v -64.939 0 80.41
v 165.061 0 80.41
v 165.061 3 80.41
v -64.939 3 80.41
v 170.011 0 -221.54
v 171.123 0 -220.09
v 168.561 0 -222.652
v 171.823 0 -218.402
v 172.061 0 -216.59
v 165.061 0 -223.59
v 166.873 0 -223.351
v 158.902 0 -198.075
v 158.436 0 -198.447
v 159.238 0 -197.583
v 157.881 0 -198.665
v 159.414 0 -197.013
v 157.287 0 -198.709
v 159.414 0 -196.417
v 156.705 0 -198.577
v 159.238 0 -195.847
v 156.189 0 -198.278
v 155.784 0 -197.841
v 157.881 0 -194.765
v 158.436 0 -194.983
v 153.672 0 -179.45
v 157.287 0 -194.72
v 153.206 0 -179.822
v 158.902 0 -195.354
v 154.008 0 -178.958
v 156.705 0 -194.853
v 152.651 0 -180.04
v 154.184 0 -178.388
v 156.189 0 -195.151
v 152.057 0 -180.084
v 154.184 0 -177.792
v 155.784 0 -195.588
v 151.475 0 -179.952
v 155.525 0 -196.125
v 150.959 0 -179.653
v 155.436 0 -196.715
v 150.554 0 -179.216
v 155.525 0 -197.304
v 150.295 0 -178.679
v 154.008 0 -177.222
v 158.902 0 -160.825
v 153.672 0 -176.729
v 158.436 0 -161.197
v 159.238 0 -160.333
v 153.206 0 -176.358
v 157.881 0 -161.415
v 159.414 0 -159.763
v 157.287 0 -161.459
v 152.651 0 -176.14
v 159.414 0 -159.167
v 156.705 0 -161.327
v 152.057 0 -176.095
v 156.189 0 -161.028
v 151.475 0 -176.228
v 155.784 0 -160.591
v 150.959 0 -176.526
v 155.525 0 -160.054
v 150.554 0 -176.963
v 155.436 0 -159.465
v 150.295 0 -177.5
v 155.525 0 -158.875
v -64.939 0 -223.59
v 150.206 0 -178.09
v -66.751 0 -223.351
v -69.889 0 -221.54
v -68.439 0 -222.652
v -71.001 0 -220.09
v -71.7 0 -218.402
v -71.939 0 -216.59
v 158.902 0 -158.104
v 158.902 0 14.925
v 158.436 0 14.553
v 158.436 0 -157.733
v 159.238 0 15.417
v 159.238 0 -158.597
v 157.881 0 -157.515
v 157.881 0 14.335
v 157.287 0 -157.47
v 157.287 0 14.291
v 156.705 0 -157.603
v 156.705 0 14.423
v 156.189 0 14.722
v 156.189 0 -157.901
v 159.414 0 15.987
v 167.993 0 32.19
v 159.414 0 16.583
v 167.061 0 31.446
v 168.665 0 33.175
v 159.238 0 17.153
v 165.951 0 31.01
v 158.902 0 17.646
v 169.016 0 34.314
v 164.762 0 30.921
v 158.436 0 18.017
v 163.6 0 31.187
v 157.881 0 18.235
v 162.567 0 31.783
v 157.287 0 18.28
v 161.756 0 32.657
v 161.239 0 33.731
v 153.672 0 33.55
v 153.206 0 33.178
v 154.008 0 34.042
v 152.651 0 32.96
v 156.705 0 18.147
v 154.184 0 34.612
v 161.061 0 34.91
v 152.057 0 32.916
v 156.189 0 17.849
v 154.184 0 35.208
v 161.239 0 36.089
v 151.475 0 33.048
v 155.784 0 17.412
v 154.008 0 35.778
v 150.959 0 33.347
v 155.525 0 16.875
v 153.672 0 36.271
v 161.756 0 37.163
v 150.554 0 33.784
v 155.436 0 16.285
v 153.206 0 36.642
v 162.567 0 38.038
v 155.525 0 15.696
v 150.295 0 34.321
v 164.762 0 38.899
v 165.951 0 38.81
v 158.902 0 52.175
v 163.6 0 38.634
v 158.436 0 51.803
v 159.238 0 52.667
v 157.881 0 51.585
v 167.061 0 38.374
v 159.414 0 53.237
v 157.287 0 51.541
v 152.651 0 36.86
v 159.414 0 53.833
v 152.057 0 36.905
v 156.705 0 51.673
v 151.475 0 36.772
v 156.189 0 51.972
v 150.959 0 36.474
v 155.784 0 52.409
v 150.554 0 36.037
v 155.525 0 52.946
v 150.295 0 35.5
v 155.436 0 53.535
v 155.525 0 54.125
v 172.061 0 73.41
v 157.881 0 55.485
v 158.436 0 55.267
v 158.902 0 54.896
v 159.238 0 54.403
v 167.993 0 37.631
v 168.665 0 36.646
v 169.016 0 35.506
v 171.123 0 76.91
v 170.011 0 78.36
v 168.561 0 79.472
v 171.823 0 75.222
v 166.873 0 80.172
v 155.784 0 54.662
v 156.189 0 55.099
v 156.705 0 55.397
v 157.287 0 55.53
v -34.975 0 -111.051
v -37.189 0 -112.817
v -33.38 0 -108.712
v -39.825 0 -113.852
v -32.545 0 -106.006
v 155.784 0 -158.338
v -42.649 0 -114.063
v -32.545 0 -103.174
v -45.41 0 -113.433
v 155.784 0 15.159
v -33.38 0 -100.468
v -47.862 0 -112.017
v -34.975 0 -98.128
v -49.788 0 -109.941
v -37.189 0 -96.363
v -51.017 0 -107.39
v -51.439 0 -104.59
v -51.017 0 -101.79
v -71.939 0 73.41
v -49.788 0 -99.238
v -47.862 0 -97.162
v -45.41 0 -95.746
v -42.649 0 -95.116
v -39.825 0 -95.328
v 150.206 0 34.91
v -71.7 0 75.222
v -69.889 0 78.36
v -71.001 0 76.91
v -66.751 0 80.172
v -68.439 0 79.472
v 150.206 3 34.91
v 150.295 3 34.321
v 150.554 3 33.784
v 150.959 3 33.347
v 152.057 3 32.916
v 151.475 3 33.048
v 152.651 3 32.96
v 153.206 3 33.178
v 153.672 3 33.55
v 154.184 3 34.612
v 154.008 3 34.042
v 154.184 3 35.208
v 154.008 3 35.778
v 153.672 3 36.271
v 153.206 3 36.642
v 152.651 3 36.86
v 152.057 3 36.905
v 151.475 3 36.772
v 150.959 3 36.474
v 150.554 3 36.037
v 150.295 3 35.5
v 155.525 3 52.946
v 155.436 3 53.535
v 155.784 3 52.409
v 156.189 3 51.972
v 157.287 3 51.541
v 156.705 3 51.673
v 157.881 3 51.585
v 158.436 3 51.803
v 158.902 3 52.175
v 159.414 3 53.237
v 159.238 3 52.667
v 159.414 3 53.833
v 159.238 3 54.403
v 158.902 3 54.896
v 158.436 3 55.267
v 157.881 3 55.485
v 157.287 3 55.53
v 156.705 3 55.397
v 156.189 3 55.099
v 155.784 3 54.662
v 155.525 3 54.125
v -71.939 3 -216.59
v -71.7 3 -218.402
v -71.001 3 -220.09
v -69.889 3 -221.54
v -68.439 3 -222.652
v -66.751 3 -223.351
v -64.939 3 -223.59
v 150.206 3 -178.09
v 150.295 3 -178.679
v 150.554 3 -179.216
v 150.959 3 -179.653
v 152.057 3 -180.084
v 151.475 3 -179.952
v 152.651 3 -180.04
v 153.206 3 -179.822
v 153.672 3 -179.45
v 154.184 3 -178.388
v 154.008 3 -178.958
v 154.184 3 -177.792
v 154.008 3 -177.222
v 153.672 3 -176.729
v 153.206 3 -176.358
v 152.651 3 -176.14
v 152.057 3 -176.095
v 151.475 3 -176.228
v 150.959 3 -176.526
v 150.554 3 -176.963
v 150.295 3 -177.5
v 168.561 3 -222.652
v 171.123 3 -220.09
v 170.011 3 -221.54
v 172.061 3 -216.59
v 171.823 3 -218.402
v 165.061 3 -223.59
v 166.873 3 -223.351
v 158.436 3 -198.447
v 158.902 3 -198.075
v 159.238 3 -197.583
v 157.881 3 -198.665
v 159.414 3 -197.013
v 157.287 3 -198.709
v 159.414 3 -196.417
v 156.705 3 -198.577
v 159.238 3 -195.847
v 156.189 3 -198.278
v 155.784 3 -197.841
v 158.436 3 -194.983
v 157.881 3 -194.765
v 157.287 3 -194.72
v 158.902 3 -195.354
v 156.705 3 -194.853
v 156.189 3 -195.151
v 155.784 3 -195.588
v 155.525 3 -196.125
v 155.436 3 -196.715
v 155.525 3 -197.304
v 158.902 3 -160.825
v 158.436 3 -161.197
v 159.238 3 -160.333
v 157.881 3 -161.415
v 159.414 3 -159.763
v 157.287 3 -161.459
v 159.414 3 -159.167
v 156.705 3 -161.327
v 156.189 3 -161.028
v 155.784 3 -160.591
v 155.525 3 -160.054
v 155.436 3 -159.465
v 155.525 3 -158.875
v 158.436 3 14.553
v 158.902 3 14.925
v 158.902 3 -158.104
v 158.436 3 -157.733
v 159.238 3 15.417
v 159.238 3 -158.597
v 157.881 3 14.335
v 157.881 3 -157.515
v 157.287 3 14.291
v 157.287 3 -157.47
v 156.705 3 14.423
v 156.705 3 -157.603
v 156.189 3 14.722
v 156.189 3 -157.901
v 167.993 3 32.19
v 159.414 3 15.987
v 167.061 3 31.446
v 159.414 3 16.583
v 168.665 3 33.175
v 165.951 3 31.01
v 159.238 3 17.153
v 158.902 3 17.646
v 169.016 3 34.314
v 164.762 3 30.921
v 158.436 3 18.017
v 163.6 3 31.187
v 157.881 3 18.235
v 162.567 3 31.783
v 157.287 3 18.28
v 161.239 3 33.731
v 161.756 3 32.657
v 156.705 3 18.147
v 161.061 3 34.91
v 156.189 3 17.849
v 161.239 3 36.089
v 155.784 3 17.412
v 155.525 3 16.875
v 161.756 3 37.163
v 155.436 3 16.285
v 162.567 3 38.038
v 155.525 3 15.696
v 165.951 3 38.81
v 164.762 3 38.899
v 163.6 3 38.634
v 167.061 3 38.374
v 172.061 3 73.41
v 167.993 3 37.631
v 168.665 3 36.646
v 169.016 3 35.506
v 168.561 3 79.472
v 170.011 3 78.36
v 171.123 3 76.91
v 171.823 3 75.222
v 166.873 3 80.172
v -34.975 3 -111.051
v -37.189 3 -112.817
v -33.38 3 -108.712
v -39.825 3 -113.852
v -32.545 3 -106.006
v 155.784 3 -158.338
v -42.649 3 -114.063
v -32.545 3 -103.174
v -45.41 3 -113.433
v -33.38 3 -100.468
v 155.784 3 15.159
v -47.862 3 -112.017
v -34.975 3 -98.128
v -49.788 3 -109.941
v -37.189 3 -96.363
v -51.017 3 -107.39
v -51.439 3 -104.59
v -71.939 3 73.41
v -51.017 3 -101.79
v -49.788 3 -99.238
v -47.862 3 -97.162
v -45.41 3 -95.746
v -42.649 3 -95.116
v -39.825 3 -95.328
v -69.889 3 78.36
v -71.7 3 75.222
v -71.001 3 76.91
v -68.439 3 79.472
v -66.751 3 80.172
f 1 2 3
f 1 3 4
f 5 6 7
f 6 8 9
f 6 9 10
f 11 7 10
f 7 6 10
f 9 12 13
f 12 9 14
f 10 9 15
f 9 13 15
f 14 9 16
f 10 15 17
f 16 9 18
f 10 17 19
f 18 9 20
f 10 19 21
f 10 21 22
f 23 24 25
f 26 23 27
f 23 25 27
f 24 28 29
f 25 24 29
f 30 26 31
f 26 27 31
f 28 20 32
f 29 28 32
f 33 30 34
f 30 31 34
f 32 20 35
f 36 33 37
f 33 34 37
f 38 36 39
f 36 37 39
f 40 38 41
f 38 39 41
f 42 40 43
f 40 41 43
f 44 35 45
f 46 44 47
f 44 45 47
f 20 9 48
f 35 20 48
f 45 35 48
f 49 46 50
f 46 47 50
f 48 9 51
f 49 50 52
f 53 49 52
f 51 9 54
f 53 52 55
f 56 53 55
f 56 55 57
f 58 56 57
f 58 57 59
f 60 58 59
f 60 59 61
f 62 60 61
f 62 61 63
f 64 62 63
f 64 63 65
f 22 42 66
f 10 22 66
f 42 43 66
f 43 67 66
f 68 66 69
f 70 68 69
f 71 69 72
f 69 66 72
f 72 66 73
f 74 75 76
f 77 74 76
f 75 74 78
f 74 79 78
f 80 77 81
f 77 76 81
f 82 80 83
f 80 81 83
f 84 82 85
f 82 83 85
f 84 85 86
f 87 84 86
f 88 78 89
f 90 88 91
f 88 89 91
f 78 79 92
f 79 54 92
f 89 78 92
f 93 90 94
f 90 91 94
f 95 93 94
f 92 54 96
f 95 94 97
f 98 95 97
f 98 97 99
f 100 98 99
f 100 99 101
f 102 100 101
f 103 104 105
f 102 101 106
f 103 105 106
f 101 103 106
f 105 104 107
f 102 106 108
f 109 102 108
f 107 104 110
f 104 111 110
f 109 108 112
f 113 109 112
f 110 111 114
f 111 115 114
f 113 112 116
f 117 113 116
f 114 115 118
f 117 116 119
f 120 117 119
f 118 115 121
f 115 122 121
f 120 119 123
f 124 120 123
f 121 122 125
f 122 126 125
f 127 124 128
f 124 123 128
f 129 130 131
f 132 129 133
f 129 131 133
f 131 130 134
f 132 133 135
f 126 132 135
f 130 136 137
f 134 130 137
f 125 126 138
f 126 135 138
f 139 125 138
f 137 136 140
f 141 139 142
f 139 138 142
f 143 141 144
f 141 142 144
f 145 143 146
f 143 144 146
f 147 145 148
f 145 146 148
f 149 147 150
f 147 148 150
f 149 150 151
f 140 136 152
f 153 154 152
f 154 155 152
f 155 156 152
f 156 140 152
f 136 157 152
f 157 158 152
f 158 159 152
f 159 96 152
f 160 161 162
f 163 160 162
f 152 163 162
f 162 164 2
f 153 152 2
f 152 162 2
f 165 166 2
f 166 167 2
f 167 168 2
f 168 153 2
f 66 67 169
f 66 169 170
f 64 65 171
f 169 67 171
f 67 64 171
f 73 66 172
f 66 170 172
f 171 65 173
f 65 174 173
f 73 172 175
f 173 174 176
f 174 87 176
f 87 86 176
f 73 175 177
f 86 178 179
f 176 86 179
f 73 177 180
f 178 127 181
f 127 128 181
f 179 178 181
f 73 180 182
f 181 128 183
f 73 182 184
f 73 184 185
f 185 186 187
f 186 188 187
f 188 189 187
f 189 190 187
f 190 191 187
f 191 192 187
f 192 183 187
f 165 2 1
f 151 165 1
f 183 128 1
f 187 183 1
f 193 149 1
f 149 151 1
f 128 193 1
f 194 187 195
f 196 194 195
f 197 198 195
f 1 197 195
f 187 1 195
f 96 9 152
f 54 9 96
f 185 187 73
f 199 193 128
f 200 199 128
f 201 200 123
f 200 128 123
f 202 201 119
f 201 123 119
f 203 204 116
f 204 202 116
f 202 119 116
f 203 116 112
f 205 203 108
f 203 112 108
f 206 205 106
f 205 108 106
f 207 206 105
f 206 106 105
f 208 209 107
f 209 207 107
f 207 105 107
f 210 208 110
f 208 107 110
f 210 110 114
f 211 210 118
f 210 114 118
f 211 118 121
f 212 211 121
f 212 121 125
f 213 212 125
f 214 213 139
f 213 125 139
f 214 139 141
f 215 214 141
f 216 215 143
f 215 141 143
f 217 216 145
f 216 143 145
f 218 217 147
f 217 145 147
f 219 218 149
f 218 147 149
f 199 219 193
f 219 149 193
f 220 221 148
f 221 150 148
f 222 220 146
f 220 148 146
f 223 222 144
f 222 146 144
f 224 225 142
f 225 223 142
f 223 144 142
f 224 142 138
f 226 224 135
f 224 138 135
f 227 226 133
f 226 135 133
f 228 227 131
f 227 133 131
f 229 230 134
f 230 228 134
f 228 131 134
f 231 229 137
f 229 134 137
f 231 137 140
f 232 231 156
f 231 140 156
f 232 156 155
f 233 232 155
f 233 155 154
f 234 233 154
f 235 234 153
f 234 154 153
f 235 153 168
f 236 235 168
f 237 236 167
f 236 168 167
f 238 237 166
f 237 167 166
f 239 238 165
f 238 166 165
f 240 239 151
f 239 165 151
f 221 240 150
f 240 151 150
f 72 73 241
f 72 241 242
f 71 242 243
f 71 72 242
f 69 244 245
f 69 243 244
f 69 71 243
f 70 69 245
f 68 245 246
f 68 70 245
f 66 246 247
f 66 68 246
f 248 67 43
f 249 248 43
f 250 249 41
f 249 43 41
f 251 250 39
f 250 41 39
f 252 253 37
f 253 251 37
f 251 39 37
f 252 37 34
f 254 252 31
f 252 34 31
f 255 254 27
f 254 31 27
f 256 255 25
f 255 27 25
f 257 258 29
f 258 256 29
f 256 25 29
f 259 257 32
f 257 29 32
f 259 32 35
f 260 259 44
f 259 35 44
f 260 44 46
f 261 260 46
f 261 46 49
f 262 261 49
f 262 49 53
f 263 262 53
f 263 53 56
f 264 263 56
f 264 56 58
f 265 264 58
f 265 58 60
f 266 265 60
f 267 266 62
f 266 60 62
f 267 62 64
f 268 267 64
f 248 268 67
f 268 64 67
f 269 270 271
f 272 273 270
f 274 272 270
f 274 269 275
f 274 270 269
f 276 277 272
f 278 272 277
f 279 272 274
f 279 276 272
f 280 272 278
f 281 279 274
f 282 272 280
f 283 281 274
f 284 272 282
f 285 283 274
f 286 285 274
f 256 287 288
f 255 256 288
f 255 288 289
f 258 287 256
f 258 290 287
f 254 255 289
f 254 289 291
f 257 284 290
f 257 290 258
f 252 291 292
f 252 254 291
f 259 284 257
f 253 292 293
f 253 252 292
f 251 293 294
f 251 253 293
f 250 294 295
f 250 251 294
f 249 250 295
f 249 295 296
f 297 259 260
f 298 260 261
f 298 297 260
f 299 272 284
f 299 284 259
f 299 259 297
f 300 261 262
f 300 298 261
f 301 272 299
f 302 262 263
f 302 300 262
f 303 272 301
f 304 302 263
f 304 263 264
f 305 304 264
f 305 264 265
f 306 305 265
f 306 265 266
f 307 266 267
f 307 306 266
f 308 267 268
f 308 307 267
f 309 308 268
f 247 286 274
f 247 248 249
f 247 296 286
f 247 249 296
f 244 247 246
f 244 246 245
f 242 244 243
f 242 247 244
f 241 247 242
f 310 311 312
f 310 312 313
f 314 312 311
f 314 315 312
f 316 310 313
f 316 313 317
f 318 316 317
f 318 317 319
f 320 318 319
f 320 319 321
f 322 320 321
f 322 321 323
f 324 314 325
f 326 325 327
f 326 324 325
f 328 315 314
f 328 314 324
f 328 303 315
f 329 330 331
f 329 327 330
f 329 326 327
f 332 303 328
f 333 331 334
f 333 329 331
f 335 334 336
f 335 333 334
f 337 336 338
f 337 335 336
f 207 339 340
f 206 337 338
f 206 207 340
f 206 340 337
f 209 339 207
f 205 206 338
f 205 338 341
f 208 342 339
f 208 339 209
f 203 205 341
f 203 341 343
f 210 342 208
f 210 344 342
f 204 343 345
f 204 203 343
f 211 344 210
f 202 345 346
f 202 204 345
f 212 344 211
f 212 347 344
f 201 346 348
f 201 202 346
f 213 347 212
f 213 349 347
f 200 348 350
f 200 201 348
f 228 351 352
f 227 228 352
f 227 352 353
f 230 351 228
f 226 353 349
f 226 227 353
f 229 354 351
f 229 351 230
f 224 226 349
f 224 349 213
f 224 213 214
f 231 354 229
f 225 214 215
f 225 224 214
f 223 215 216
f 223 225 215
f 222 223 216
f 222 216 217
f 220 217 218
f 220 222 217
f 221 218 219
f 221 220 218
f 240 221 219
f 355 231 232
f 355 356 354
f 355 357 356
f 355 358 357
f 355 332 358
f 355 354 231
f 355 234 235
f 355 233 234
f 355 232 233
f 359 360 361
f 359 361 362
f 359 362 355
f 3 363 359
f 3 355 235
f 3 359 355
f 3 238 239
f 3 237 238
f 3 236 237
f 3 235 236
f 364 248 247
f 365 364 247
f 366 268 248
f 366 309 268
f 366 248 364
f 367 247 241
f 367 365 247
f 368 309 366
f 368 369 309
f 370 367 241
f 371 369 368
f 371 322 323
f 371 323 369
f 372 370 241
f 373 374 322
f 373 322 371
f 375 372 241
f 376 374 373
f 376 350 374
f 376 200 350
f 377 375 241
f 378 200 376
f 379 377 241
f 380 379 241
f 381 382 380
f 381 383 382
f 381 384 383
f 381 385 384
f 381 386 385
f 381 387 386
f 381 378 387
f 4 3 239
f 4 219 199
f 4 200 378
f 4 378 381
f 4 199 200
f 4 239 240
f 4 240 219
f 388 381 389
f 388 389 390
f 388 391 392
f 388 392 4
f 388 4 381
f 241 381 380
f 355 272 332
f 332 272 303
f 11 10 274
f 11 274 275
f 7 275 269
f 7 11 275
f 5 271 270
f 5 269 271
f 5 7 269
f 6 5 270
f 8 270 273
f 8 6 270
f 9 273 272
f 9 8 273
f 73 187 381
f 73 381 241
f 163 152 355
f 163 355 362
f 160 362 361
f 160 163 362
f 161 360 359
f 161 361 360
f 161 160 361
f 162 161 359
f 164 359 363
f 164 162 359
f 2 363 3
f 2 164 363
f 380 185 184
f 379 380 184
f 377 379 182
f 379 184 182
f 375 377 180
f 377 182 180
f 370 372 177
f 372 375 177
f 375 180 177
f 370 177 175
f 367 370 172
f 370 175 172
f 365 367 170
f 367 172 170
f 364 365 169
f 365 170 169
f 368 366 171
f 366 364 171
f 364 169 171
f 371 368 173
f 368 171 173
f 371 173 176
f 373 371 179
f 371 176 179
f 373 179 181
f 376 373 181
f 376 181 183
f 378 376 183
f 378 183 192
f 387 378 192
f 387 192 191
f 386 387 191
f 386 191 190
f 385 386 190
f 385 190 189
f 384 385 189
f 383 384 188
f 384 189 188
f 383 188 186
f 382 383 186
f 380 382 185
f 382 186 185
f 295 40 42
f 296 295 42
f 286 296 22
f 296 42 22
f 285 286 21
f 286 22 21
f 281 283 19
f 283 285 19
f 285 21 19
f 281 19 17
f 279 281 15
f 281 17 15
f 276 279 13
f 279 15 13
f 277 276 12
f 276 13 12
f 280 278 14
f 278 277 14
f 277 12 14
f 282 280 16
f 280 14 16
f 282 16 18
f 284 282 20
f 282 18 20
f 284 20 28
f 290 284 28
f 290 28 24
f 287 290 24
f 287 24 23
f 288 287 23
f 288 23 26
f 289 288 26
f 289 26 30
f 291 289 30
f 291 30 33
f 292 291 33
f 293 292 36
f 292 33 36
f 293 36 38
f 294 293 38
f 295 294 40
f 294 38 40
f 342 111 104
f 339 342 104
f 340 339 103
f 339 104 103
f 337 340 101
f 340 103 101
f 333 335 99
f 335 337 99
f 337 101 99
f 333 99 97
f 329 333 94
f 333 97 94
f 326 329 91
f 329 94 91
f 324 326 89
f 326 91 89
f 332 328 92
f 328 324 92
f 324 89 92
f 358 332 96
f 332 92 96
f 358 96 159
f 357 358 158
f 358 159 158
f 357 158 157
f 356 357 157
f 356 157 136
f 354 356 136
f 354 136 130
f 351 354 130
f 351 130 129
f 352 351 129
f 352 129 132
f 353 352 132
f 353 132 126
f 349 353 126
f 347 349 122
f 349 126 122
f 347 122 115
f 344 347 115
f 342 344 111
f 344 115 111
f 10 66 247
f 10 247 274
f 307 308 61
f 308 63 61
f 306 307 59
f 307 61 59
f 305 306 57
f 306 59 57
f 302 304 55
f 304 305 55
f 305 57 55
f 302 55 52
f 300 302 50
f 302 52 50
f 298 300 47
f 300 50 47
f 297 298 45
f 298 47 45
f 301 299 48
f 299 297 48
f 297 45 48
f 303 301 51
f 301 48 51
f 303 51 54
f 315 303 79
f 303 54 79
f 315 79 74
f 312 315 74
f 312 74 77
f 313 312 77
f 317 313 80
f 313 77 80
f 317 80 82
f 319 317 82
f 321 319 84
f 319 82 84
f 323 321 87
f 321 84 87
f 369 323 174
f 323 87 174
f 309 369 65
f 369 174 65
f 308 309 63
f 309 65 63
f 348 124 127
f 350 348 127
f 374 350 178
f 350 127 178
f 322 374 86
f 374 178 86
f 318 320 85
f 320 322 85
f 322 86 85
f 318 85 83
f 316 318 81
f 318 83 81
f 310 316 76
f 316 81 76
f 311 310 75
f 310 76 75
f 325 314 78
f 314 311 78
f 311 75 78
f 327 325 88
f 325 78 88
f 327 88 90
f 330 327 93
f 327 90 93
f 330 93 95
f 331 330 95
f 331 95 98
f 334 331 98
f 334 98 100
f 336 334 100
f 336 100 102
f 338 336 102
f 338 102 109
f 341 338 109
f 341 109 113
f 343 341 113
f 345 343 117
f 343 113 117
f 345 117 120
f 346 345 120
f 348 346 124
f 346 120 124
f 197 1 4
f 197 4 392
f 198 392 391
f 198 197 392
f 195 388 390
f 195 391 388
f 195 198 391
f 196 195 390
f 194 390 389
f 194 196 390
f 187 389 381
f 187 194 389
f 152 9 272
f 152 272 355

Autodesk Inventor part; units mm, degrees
ref_plane "YZ Plane" through (0, 0, 0) normal (1, 0, 0) x (0, 1, 0)
ref_plane "XZ Plane" through (0, 0, 0) normal (0, 1, 0) x (-1, 0, 0)
ref_plane "XY Plane" through (0, 0, 0) normal (0, 0, 1) x (1, 0, 0)
sketch "Boceto1" plane through (0, 0, 0) normal (0, 1, 0) x (-1, 0, 0)
  line L0 (64.9389, -223.5898) -> (-165.0611, -223.5898)
  line L1 (-172.0611, -216.5898) -> (-172.0611, 73.4102)
  line L2 (-165.0611, 80.4102) -> (64.9389, 80.4102)
  line L3 (71.9389, 73.4102) -> (71.9389, -216.5898)
  circle A0 centre (-157.4361, -196.7148) radius 2
  circle A1 centre (-157.4361, -159.4648) radius 2
  circle A2 centre (-152.2061, -178.0898) radius 2
  circle A3 centre (-157.4361, 53.5352) radius 2
  circle A4 centre (-157.4361, 16.2852) radius 2
  circle A5 centre (-152.2061, 34.9102) radius 2
  circle A6 centre (-165.0611, 34.9102) radius 4
  circle A7 centre (41.9389, -104.5898) radius 9.5
  arc A8 (64.9389, -223.5898) -> (71.9389, -216.5898) centre (64.9389, -216.5898) ccw
  arc A9 (-172.0611, -216.5898) -> (-165.0611, -223.5898) centre (-165.0611, -216.5898) ccw
  arc A10 (-165.0611, 80.4102) -> (-172.0611, 73.4102) centre (-165.0611, 73.4102) ccw
  arc A11 (71.9389, 73.4102) -> (64.9389, 80.4102) centre (64.9389, 73.4102) ccw
  point P0 (0, 0)
  point P1 (63.9389, -223.5898)
  point P2 (71.9389, -215.5898)
  point P3 (-172.0611, -215.5898)
  point P4 (-164.0611, -223.5898)
  point P5 (-172.0611, 72.4102)
  point P6 (-164.0611, 80.4102)
  point P7 (63.9389, 80.4102)
  point P8 (71.9389, 72.4102)
  dimension "d10" = 4
  dimension "d11" = 14.625
  dimension "d12" = 26.875
  dimension "d13" = 4
  dimension "d14" = 37.25
  dimension "d15" = 14.625
  dimension "d16" = 4
  dimension "d17" = 18.625
  dimension "d18" = 19.855
  dimension "d19" = 8
  dimension "d20" = 7
  dimension "d21" = 19
  dimension "d22" = 30
  dimension "d23" = 244
  dimension "d24" = 304
  dimension "d25" = 7
  dimension "d26" = 7
  dimension "d27" = 7
  dimension "d28" = 185
extrude "Extrusión1" add sketch "Boceto1" along normal blind 3
properties part number "Puerta Lateral Derecha"
